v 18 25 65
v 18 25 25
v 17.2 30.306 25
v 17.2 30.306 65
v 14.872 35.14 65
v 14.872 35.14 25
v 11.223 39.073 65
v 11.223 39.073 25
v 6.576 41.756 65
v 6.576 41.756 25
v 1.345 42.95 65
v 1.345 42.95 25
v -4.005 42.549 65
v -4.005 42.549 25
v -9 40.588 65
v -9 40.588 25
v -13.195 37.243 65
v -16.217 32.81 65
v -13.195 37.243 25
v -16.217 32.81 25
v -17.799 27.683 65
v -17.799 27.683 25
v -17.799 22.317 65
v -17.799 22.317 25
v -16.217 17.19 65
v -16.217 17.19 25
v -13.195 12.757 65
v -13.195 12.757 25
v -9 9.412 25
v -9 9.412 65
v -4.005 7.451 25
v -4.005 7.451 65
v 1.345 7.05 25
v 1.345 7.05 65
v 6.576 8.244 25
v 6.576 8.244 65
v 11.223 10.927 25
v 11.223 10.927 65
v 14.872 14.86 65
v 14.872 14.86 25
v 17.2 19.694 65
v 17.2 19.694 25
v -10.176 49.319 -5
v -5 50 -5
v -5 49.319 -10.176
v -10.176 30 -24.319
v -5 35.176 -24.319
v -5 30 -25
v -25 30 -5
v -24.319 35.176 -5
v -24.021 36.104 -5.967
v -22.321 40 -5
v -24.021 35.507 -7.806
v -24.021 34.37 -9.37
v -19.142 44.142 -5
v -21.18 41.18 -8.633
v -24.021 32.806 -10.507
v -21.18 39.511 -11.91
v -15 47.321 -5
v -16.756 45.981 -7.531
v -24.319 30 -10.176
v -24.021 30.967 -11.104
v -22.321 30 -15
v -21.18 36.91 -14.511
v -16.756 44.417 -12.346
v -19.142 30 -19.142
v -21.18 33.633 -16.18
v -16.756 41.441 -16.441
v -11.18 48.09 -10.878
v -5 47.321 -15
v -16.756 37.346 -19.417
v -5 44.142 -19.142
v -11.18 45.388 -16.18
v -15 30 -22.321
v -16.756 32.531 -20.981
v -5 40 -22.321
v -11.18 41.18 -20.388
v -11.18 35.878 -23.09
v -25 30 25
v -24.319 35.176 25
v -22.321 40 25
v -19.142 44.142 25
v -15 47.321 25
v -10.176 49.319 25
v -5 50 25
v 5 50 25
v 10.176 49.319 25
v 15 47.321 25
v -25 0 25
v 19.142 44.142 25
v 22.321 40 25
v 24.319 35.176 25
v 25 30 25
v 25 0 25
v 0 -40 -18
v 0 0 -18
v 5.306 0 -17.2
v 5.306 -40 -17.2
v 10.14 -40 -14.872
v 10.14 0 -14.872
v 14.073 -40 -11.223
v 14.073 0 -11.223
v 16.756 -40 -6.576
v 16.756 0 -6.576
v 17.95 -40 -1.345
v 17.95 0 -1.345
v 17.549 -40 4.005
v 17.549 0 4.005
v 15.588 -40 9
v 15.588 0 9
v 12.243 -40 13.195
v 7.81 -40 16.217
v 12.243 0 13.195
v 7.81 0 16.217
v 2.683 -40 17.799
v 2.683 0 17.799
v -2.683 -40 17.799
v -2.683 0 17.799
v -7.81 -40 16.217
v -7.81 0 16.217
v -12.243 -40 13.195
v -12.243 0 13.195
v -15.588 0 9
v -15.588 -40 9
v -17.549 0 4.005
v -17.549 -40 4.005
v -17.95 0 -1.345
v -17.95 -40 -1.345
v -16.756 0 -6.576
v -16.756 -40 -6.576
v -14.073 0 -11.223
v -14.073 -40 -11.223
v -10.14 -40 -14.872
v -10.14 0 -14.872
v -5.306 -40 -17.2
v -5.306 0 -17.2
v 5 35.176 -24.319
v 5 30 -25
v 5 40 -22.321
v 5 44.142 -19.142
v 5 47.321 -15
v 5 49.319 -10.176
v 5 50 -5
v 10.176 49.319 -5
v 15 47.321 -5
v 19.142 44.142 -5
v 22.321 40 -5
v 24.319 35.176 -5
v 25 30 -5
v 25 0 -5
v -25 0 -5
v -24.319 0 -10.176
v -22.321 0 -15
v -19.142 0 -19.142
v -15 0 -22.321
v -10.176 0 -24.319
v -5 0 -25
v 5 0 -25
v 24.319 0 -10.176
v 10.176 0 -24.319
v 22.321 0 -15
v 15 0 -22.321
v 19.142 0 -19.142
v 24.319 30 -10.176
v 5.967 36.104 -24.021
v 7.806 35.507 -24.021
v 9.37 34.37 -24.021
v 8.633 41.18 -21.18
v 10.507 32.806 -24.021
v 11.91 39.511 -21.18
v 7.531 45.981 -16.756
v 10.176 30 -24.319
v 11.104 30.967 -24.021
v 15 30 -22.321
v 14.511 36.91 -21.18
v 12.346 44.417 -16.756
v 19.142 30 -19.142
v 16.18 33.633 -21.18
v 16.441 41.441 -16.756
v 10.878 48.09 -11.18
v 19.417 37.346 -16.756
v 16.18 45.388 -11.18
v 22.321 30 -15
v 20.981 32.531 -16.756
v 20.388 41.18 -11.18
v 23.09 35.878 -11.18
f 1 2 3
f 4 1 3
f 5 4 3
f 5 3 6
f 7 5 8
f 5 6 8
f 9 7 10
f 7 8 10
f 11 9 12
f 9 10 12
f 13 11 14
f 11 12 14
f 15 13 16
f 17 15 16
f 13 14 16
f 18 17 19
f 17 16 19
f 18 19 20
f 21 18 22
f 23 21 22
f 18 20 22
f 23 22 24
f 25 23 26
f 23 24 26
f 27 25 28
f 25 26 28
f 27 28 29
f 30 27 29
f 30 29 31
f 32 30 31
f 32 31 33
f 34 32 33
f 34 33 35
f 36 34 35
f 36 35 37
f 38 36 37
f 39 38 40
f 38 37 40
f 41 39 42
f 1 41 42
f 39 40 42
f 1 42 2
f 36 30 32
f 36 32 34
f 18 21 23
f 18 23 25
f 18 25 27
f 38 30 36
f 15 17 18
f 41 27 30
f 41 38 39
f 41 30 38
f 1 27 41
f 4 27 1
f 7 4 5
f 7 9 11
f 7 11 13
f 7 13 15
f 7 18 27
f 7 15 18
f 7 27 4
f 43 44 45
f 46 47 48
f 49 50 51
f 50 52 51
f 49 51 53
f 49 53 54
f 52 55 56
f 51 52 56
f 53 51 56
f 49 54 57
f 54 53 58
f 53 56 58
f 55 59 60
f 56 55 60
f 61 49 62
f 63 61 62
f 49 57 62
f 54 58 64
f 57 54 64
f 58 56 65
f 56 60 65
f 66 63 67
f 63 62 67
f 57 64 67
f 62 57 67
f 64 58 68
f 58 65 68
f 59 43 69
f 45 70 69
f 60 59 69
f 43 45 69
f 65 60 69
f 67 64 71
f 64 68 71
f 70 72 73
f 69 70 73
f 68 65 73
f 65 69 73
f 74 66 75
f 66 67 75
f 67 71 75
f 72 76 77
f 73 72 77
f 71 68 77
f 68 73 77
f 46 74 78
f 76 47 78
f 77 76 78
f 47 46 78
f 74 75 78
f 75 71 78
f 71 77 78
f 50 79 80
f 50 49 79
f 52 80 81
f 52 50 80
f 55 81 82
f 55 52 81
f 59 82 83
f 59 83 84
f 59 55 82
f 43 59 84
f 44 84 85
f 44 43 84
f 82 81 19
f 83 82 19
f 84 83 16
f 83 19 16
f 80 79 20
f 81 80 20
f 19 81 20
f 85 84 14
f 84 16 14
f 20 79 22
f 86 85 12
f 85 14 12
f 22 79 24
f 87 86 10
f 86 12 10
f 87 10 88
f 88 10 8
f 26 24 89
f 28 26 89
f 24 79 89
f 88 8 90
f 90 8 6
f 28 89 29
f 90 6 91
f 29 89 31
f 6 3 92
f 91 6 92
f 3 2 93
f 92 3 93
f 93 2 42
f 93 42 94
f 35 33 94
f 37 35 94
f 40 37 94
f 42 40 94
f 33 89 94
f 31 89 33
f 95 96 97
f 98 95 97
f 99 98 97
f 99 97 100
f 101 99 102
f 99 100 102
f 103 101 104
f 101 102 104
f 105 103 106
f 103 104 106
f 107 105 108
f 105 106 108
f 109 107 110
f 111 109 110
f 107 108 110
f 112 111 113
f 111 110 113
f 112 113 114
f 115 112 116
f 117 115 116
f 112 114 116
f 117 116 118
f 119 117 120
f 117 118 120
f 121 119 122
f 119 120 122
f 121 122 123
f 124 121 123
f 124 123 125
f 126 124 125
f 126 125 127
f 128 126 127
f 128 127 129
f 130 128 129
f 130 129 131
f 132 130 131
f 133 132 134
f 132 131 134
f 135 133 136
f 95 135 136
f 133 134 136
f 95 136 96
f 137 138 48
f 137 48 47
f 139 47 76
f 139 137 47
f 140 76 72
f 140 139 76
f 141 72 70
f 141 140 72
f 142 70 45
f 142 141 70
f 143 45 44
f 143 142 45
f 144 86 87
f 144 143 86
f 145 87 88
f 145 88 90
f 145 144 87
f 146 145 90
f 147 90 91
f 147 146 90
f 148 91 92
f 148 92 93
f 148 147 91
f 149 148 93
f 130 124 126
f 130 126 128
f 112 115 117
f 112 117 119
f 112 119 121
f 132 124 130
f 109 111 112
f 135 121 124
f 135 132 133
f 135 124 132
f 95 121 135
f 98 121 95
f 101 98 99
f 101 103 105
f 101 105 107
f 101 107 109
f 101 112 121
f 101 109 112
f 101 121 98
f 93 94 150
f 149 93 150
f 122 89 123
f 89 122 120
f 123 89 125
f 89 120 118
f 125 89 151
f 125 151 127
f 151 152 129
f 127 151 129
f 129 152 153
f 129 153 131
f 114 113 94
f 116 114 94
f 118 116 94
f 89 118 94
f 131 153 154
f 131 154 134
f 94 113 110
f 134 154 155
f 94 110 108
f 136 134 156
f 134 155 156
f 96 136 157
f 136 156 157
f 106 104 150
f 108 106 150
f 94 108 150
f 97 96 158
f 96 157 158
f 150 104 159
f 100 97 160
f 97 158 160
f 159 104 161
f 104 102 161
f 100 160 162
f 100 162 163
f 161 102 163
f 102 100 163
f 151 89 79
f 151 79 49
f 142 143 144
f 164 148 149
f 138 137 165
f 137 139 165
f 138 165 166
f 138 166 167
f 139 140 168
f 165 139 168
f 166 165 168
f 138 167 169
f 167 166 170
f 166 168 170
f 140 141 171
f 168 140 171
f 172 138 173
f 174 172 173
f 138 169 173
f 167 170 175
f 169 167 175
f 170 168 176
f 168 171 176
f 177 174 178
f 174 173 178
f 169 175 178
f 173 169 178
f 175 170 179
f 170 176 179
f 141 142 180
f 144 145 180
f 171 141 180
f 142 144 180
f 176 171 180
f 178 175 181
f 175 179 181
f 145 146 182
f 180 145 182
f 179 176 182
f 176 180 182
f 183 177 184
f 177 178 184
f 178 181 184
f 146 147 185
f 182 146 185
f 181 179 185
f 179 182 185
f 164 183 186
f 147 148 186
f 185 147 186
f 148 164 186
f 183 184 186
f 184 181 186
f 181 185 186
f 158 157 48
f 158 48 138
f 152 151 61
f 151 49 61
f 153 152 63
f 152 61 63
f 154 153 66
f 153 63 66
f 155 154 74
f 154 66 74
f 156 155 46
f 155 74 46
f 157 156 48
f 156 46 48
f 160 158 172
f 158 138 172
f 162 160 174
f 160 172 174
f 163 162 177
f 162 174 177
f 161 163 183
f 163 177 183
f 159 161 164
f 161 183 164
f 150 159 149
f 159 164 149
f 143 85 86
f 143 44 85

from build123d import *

# Parameters (mm, degrees)
SKETCH1_W           = 50
SKETCH1_H           = 50
BOSS_EXTRUDE1_DEPTH = 50
SKETCH3_R           = 18
BOSS_EXTRUDE2_DEPTH = 40
SKETCH4_R           = 18
BOSS_EXTRUDE3_DEPTH = 40
FILLET1_R           = 20


with BuildPart() as part:
    # Sketch1 → Boss-Extrude1 (new body)
    with BuildSketch(Plane(origin=(0, 0, 0), x_dir=(1, 0, 0), z_dir=(0, 1, 0))):
        Rectangle(SKETCH1_W, SKETCH1_H)
    extrude(amount=BOSS_EXTRUDE1_DEPTH)

    # Sketch3 → Boss-Extrude2 (add)
    with BuildSketch(Plane.XY.offset(25)):
        with Locations((0, 25)):
            Circle(SKETCH3_R)
    extrude(amount=BOSS_EXTRUDE2_DEPTH)

    # Sketch4 → Boss-Extrude3 (add)
    with BuildSketch(Plane.XZ):
        with Locations(Location((0, 0, 0), (0, 0, 270))):
            Circle(SKETCH4_R)
    extrude(amount=BOSS_EXTRUDE3_DEPTH)

    # Fillet1
    fillet1_edges = [part.edges().sort_by_distance(p)[0] for p in [
        (25, 50, 0),
        (0, 50, -25),
        (-25, 50, 0),
        (-25, 25, -25),
        (25, 25, -25),
    ]]
    fillet(fillet1_edges, radius=FILLET1_R)


solid = part.part
